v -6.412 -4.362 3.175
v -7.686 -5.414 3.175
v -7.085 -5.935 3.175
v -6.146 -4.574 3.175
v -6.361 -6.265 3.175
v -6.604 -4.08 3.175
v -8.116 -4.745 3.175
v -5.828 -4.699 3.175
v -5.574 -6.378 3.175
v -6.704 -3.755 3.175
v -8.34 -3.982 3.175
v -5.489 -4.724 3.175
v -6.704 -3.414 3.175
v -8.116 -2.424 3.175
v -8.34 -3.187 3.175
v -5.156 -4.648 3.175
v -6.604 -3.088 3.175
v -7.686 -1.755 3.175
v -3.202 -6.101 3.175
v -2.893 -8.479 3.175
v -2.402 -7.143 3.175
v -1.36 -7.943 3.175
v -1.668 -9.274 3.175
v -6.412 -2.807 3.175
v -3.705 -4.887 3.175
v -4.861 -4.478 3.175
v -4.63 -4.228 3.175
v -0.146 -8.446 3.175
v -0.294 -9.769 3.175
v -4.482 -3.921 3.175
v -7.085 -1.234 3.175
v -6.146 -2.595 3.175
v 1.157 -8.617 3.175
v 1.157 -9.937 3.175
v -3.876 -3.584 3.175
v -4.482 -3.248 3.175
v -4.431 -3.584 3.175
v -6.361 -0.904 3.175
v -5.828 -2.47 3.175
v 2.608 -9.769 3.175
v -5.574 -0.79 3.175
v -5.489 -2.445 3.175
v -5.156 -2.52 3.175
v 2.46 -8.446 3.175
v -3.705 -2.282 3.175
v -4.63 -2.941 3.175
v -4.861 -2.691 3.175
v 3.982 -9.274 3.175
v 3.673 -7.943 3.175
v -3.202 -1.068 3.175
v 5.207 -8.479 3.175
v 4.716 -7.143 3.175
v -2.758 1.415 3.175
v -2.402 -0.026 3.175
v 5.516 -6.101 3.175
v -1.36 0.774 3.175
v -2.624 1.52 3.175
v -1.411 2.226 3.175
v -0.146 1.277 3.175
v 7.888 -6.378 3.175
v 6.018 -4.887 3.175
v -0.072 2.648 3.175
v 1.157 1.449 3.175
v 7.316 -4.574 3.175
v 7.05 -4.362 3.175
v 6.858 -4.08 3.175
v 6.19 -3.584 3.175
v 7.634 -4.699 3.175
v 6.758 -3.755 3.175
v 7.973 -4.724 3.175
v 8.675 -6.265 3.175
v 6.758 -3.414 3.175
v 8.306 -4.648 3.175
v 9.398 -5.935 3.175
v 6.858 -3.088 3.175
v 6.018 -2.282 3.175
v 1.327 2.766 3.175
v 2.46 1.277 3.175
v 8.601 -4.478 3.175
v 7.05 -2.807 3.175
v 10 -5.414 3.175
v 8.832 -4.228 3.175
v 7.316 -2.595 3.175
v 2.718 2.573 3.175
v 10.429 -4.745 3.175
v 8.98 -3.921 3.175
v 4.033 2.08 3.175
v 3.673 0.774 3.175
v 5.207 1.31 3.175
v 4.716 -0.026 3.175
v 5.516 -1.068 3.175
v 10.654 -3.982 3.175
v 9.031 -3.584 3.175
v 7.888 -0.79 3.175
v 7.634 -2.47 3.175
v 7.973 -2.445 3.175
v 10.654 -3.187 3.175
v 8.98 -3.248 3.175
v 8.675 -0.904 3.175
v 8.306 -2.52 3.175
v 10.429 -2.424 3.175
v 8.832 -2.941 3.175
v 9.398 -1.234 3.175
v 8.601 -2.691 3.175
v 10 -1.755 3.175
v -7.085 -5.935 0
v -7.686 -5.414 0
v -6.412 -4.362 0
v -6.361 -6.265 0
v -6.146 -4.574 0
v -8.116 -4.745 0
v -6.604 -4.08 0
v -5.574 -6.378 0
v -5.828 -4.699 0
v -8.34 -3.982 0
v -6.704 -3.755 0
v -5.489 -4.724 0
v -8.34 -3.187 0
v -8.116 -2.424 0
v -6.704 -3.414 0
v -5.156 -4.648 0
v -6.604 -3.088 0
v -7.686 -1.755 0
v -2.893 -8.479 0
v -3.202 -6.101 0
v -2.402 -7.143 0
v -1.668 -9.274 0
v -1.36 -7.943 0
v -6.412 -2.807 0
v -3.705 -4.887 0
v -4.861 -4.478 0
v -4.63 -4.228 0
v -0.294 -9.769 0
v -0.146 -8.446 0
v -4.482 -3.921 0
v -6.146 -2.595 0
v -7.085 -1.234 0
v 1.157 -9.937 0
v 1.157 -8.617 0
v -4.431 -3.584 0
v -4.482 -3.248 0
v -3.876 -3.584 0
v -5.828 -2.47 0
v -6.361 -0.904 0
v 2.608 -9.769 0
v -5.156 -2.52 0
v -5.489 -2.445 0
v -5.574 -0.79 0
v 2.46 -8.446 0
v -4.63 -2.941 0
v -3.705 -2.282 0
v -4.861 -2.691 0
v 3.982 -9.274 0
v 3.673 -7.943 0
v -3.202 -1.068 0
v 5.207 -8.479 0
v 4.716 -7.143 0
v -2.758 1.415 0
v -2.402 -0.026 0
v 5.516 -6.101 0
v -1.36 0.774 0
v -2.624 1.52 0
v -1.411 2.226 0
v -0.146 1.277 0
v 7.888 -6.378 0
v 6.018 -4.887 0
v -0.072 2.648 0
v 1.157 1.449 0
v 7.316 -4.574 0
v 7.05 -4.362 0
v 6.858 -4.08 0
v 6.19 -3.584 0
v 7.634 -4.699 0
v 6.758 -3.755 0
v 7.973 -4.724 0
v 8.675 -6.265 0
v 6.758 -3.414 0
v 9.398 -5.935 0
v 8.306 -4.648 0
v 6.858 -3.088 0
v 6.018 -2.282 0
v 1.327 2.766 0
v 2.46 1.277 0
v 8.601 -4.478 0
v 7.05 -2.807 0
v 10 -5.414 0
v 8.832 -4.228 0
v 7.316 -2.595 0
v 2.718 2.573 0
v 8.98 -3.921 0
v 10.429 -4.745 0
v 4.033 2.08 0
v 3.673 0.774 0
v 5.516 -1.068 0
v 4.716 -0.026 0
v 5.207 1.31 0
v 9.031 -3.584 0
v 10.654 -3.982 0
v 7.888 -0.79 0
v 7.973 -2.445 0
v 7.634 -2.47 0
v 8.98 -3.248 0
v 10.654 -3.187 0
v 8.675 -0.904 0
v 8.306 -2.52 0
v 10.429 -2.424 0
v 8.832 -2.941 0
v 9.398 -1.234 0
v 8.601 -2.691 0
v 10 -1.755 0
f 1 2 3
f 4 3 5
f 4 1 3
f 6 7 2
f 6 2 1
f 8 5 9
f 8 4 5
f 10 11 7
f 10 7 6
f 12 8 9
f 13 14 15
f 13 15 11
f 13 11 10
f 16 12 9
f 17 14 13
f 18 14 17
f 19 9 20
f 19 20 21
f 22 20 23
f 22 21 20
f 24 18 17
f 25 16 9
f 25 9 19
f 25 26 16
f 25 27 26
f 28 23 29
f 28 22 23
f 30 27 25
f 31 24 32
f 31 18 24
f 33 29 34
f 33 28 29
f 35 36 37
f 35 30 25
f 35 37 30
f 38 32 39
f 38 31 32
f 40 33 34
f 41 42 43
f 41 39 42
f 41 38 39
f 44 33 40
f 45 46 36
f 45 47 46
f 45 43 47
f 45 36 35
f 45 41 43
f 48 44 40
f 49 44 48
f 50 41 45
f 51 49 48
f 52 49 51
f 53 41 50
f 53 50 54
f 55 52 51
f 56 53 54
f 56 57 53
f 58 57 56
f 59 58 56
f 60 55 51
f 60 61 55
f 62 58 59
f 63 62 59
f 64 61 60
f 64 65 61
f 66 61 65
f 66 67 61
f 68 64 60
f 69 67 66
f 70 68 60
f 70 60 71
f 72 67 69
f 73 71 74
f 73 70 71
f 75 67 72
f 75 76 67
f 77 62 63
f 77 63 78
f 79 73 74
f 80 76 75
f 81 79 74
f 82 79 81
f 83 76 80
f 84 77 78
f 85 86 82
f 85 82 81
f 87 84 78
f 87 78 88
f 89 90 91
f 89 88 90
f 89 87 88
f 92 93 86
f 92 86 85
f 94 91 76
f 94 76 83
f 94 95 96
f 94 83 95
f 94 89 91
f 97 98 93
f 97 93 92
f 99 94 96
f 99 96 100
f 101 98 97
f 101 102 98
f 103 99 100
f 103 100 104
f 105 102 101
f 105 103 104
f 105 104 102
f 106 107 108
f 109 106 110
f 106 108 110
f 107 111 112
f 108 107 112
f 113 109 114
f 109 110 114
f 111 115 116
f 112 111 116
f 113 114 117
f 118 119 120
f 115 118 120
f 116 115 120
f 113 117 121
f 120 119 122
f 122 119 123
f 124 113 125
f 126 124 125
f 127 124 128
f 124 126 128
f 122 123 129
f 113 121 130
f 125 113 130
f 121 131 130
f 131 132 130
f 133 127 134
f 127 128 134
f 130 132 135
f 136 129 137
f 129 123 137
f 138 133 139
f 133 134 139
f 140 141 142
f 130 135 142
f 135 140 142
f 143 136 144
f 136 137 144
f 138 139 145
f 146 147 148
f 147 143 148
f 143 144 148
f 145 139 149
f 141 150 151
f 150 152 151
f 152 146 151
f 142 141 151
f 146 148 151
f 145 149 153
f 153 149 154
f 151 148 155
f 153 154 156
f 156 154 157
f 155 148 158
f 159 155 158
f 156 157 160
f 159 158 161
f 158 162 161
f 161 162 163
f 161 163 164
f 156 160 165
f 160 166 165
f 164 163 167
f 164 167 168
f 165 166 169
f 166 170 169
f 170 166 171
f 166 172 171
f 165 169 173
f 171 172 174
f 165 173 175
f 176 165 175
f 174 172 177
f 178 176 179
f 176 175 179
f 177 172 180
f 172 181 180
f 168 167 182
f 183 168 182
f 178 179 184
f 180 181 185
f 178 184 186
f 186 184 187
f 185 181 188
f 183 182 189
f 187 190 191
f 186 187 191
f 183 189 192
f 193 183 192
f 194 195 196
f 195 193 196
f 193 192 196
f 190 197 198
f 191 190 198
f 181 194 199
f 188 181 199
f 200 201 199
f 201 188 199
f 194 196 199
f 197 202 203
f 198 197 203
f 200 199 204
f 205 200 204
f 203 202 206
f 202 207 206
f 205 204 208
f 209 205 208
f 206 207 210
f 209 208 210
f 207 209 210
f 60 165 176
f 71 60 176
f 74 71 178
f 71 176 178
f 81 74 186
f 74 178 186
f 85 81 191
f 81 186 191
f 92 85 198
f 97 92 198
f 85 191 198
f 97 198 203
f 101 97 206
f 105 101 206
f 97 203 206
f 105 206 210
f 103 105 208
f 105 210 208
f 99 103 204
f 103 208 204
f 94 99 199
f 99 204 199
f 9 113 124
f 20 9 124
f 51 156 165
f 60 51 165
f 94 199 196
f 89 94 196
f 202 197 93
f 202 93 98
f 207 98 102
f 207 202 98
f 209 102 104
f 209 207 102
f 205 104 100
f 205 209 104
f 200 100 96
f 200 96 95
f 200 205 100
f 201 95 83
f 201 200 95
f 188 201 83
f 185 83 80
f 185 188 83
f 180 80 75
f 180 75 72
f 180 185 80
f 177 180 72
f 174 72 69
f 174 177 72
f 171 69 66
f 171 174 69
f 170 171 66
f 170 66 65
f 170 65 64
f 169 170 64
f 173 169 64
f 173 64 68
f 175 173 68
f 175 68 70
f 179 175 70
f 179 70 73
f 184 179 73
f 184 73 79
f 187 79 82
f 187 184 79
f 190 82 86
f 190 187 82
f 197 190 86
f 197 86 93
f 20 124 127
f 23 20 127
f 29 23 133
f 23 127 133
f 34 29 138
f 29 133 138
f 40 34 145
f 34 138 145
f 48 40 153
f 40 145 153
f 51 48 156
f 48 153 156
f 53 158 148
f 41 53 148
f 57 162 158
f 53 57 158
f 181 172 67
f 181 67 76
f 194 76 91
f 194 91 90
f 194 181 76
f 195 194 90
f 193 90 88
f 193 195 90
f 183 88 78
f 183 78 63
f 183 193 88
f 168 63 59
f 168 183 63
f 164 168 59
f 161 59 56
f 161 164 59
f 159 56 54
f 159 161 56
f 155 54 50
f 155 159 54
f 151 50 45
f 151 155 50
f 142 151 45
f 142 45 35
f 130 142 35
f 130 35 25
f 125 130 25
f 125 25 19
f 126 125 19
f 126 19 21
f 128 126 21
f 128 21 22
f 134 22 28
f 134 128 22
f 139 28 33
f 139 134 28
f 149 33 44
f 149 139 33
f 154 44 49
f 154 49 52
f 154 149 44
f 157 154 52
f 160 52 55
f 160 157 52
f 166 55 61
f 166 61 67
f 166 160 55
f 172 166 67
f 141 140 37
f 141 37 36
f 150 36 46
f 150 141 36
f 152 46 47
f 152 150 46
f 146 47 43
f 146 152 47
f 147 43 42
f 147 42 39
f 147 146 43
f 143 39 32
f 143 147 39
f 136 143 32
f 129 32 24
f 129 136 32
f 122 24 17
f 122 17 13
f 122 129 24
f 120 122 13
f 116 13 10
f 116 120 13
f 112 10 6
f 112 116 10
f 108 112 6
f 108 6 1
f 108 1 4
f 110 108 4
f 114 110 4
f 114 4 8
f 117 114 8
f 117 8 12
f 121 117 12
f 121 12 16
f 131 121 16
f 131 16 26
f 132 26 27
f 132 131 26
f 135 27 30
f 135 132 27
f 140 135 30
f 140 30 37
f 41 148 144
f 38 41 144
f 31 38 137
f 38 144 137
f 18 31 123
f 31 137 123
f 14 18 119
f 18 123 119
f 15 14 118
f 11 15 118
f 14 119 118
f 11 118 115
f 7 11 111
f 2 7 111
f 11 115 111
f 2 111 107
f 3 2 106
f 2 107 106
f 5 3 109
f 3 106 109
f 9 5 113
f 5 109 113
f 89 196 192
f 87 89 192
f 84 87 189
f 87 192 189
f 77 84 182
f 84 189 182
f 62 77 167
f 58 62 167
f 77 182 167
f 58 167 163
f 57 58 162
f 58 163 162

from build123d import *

# Parameters (mm, degrees)
SKETCH1_R           = 1.143
SKETCH1_R_2         = 5.0330227
BOSS_EXTRUDE1_DEPTH = 3.175


with BuildPart() as part:
    # Sketch1 → Boss-Extrude1 (new body)
    with BuildSketch(Plane.XY):
        with BuildLine():
            Line((-2.758483637, 1.414768622), (-5.574053245, -0.790421797))
            ThreePointArc((-5.574053245, -0.790421797), (-8.368053245, -3.584421797), (-5.574053245, -6.378421797))
            Line((-5.574053245, -6.378421797), (-2.89267695, -8.478510283))
            ThreePointArc((-2.89267695, -8.478510283), (1.156946755, -9.936709122), (5.206570461, -8.478510283))
            Line((5.206570461, -8.478510283), (7.887946755, -6.378421797))
            ThreePointArc((7.887946755, -6.378421797), (10.681946755, -3.584421797), (7.887946755, -0.790421797))
            Line((7.887946755, -0.790421797), (5.206570461, 1.309666689))
            ThreePointArc((5.206570461, 1.309666689), (1.327399862, 2.765578203), (-2.624290324, 1.519870555))
            Line((-2.624290324, 1.519870555), (-2.758483637, 1.414768622))
        make_face()
        with Locations((7.887946755, -3.584421797)):
            Circle(SKETCH1_R, mode=Mode.SUBTRACT)
        with Locations((-5.574053245, -3.584421797)):
            Circle(SKETCH1_R, mode=Mode.SUBTRACT)
        with Locations((1.156946755, -3.584421797)):
            Circle(SKETCH1_R_2, mode=Mode.SUBTRACT)
    extrude(amount=BOSS_EXTRUDE1_DEPTH)


solid = part.part
